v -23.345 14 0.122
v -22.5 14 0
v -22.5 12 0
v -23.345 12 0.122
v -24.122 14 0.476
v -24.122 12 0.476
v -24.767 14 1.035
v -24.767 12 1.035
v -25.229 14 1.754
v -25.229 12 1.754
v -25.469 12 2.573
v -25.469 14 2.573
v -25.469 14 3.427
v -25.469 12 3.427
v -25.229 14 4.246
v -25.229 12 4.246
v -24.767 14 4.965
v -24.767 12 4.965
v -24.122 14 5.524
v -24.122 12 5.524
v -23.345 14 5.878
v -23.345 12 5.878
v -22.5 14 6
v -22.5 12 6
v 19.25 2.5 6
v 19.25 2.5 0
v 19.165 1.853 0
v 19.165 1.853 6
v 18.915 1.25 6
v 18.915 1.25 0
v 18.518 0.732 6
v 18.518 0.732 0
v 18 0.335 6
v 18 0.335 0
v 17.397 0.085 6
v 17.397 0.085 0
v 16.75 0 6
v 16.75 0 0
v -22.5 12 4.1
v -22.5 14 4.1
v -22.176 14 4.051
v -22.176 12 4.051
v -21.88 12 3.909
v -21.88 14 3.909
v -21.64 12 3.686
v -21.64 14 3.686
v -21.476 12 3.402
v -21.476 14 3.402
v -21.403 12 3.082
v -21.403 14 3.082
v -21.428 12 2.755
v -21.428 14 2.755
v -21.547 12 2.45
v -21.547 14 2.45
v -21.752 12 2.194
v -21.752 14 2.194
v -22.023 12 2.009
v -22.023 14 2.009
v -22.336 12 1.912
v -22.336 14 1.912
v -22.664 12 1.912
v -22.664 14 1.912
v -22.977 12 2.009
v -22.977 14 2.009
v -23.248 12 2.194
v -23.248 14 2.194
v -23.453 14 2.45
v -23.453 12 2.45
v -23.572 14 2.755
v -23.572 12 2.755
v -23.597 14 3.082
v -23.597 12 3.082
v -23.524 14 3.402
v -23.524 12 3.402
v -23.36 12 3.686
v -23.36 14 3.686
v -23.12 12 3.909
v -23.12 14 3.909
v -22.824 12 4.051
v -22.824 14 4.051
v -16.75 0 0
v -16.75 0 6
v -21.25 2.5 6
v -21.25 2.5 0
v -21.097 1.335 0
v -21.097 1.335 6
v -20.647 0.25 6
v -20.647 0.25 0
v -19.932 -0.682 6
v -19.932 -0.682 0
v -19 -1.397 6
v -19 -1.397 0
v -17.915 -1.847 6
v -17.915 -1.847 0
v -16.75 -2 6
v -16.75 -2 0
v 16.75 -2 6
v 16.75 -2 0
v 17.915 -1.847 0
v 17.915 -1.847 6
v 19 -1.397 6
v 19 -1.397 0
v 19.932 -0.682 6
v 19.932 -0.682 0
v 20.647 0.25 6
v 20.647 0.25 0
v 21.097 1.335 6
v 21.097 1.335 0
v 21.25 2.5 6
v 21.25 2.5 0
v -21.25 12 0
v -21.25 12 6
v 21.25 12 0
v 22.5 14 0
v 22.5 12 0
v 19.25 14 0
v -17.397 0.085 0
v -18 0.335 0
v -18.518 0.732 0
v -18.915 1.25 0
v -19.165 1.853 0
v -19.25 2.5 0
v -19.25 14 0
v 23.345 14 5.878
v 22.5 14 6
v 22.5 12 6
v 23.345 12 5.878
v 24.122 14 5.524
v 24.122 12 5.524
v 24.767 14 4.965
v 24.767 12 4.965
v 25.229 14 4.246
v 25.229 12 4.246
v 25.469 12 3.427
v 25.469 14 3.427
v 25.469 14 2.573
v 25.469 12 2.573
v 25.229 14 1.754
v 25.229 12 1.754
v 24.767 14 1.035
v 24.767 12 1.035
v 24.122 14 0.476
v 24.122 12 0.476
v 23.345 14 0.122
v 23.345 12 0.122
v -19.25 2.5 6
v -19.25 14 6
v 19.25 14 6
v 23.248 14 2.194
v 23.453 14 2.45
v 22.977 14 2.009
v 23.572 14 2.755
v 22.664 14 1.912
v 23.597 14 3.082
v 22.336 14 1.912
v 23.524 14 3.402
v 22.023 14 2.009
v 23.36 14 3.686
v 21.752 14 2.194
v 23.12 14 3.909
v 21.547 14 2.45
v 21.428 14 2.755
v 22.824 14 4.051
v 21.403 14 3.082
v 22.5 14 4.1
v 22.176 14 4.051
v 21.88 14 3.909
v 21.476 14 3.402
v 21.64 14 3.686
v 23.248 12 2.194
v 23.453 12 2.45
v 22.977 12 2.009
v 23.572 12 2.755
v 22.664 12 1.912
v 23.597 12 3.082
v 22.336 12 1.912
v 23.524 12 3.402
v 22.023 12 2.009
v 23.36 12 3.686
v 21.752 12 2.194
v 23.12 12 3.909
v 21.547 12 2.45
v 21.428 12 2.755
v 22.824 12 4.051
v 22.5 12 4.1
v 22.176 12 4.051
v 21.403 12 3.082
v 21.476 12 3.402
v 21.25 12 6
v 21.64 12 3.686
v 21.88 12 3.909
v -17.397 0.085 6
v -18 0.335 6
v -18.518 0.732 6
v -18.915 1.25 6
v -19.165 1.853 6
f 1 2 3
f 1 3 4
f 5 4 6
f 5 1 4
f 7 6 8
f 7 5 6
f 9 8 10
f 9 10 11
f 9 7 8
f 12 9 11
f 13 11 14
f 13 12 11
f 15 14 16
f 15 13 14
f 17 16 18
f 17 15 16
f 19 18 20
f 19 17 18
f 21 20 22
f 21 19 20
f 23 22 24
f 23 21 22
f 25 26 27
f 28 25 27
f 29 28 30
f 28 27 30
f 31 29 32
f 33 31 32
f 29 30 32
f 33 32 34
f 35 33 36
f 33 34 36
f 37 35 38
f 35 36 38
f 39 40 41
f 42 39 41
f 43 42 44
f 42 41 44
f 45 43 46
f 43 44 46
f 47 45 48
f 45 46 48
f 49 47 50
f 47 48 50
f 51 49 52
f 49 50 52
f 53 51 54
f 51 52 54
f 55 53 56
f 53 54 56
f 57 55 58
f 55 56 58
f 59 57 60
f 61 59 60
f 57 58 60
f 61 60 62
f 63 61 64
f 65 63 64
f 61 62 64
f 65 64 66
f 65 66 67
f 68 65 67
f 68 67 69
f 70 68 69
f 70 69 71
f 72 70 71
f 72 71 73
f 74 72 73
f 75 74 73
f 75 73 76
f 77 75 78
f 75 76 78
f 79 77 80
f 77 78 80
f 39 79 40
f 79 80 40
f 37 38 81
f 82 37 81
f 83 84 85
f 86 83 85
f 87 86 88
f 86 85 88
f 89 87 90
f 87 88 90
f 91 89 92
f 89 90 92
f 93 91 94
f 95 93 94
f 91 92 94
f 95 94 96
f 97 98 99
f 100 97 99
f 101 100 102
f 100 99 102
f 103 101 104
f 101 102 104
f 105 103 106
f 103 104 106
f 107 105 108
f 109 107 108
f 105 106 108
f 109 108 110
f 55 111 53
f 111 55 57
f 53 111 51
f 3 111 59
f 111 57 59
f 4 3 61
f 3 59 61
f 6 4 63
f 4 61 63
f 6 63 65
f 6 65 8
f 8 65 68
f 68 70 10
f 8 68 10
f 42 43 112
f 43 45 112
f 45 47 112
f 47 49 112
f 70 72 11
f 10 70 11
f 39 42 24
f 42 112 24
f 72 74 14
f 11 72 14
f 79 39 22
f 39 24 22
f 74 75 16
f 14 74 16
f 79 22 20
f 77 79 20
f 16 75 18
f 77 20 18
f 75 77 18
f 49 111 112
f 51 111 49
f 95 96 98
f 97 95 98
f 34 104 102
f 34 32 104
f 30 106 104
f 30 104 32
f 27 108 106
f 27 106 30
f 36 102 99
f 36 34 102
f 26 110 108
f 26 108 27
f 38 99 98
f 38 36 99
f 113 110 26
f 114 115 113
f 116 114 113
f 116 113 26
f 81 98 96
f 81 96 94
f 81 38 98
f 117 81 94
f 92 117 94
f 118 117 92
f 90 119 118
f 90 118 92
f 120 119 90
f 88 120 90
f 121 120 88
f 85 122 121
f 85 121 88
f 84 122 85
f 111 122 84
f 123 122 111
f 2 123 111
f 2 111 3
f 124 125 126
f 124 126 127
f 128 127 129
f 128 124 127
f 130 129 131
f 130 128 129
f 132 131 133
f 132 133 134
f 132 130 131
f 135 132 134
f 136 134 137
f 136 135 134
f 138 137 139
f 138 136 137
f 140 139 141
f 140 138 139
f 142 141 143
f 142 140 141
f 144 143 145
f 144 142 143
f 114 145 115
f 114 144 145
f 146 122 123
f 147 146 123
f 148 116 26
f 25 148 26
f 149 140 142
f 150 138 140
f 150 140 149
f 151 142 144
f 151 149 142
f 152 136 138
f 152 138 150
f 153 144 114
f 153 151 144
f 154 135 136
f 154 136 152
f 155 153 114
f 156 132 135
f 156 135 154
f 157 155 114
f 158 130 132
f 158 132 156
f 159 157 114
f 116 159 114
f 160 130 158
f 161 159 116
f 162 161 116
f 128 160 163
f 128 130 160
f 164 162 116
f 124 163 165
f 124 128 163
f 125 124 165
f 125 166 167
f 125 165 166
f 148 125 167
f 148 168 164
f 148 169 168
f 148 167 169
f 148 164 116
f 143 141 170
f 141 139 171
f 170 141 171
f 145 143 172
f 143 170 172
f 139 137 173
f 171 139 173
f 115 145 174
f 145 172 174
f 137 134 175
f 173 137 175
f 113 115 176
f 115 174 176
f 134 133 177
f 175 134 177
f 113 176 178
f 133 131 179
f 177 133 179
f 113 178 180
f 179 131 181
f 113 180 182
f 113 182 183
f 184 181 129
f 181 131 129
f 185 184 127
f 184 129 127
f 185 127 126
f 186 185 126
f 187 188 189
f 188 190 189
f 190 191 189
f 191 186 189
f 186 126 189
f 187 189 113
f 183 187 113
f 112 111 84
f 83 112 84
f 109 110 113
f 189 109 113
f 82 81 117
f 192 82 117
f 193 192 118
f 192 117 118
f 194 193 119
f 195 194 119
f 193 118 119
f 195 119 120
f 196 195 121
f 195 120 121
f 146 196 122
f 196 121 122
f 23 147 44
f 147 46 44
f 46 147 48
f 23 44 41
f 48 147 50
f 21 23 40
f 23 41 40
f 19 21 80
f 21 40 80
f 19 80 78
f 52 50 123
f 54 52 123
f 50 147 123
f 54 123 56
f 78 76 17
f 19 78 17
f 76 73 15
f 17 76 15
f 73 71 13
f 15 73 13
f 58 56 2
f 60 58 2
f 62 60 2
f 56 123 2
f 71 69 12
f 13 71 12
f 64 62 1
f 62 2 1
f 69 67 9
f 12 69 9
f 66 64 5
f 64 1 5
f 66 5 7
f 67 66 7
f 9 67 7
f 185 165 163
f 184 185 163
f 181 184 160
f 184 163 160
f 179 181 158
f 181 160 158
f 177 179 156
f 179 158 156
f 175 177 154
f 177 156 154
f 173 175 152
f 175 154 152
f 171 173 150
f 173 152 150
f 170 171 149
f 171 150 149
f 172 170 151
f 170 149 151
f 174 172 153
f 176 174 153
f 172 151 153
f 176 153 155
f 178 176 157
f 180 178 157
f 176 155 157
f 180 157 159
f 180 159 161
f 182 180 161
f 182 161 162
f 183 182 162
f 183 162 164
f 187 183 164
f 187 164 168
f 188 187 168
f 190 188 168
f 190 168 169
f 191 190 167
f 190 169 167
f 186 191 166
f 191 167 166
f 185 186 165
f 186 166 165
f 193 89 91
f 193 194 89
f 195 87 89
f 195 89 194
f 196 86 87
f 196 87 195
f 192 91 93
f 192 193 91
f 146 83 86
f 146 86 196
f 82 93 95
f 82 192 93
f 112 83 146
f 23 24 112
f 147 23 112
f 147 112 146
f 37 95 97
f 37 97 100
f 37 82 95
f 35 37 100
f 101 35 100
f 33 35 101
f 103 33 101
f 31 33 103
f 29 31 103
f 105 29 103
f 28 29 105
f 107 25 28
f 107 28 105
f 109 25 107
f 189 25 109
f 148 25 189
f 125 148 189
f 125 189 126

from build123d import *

# Parameters (mm, degrees)
BOSS_EXTRUDE1_DEPTH = 6
SKETCH3_R           = 1.1
BOSS_EXTRUDE6_DEPTH = 2


with BuildPart() as part:
    # Sketch1 → Boss-Extrude1 (new body)
    with BuildSketch(Plane.XY):
        with BuildLine():
            Line((-21.25, 14), (-21.25, 2.5))
            ThreePointArc((-21.25, 2.5), (-19.931980515, -0.681980515), (-16.75, -2))
            Line((-16.75, -2), (16.75, -2))
            ThreePointArc((16.75, -2), (19.931980515, -0.681980515), (21.25, 2.5))
            Line((21.25, 2.5), (21.25, 14))
            Line((21.25, 14), (19.25, 14))
            Line((19.25, 14), (19.25, 2.5))
            ThreePointArc((19.25, 2.5), (18.517766953, 0.732233047), (16.75, 0))
            Line((16.75, 0), (-16.75, 0))
            ThreePointArc((-16.75, 0), (-18.517766953, 0.732233047), (-19.25, 2.5))
            Line((-19.25, 2.5), (-19.25, 14))
            Line((-19.25, 14), (-21.25, 14))
        make_face()
    extrude(amount=BOSS_EXTRUDE1_DEPTH)

    # Sketch3 → Boss-Extrude6 (add)
    # profile 1 of 2: a face of its own
    with BuildSketch(Plane(origin=(0, 14, 0), x_dir=(-1, 0, 0), z_dir=(0, 1, 0))):
        with BuildLine():
            Line((-21.25, 6), (-22.5, 6))
            ThreePointArc((-22.5, 6), (-25.5, 3), (-22.5, 0))
            Line((-22.5, 0), (-21.25, 0))
            Line((-21.25, 0), (-21.25, 6))
        make_face()
        with Locations(Location((-22.5, 3, 0), (0, 0, 90))):
            Circle(SKETCH3_R, mode=Mode.SUBTRACT)
    # profile 2 of 2: a face of its own
    with BuildSketch(Plane(origin=(0, 14, 0), x_dir=(-1, 0, 0), z_dir=(0, 1, 0))):
        with BuildLine():
            Line((22.5, 6), (21.25, 6))
            Line((21.25, 6), (21.25, 0))
            Line((21.25, 0), (22.5, 0))
            ThreePointArc((22.5, 0), (25.5, 3), (22.5, 6))
        make_face()
        with Locations(Location((22.5, 3, 0), (0, 0, 90))):
            Circle(SKETCH3_R, mode=Mode.SUBTRACT)
    extrude(amount=-BOSS_EXTRUDE6_DEPTH)


solid = part.part
